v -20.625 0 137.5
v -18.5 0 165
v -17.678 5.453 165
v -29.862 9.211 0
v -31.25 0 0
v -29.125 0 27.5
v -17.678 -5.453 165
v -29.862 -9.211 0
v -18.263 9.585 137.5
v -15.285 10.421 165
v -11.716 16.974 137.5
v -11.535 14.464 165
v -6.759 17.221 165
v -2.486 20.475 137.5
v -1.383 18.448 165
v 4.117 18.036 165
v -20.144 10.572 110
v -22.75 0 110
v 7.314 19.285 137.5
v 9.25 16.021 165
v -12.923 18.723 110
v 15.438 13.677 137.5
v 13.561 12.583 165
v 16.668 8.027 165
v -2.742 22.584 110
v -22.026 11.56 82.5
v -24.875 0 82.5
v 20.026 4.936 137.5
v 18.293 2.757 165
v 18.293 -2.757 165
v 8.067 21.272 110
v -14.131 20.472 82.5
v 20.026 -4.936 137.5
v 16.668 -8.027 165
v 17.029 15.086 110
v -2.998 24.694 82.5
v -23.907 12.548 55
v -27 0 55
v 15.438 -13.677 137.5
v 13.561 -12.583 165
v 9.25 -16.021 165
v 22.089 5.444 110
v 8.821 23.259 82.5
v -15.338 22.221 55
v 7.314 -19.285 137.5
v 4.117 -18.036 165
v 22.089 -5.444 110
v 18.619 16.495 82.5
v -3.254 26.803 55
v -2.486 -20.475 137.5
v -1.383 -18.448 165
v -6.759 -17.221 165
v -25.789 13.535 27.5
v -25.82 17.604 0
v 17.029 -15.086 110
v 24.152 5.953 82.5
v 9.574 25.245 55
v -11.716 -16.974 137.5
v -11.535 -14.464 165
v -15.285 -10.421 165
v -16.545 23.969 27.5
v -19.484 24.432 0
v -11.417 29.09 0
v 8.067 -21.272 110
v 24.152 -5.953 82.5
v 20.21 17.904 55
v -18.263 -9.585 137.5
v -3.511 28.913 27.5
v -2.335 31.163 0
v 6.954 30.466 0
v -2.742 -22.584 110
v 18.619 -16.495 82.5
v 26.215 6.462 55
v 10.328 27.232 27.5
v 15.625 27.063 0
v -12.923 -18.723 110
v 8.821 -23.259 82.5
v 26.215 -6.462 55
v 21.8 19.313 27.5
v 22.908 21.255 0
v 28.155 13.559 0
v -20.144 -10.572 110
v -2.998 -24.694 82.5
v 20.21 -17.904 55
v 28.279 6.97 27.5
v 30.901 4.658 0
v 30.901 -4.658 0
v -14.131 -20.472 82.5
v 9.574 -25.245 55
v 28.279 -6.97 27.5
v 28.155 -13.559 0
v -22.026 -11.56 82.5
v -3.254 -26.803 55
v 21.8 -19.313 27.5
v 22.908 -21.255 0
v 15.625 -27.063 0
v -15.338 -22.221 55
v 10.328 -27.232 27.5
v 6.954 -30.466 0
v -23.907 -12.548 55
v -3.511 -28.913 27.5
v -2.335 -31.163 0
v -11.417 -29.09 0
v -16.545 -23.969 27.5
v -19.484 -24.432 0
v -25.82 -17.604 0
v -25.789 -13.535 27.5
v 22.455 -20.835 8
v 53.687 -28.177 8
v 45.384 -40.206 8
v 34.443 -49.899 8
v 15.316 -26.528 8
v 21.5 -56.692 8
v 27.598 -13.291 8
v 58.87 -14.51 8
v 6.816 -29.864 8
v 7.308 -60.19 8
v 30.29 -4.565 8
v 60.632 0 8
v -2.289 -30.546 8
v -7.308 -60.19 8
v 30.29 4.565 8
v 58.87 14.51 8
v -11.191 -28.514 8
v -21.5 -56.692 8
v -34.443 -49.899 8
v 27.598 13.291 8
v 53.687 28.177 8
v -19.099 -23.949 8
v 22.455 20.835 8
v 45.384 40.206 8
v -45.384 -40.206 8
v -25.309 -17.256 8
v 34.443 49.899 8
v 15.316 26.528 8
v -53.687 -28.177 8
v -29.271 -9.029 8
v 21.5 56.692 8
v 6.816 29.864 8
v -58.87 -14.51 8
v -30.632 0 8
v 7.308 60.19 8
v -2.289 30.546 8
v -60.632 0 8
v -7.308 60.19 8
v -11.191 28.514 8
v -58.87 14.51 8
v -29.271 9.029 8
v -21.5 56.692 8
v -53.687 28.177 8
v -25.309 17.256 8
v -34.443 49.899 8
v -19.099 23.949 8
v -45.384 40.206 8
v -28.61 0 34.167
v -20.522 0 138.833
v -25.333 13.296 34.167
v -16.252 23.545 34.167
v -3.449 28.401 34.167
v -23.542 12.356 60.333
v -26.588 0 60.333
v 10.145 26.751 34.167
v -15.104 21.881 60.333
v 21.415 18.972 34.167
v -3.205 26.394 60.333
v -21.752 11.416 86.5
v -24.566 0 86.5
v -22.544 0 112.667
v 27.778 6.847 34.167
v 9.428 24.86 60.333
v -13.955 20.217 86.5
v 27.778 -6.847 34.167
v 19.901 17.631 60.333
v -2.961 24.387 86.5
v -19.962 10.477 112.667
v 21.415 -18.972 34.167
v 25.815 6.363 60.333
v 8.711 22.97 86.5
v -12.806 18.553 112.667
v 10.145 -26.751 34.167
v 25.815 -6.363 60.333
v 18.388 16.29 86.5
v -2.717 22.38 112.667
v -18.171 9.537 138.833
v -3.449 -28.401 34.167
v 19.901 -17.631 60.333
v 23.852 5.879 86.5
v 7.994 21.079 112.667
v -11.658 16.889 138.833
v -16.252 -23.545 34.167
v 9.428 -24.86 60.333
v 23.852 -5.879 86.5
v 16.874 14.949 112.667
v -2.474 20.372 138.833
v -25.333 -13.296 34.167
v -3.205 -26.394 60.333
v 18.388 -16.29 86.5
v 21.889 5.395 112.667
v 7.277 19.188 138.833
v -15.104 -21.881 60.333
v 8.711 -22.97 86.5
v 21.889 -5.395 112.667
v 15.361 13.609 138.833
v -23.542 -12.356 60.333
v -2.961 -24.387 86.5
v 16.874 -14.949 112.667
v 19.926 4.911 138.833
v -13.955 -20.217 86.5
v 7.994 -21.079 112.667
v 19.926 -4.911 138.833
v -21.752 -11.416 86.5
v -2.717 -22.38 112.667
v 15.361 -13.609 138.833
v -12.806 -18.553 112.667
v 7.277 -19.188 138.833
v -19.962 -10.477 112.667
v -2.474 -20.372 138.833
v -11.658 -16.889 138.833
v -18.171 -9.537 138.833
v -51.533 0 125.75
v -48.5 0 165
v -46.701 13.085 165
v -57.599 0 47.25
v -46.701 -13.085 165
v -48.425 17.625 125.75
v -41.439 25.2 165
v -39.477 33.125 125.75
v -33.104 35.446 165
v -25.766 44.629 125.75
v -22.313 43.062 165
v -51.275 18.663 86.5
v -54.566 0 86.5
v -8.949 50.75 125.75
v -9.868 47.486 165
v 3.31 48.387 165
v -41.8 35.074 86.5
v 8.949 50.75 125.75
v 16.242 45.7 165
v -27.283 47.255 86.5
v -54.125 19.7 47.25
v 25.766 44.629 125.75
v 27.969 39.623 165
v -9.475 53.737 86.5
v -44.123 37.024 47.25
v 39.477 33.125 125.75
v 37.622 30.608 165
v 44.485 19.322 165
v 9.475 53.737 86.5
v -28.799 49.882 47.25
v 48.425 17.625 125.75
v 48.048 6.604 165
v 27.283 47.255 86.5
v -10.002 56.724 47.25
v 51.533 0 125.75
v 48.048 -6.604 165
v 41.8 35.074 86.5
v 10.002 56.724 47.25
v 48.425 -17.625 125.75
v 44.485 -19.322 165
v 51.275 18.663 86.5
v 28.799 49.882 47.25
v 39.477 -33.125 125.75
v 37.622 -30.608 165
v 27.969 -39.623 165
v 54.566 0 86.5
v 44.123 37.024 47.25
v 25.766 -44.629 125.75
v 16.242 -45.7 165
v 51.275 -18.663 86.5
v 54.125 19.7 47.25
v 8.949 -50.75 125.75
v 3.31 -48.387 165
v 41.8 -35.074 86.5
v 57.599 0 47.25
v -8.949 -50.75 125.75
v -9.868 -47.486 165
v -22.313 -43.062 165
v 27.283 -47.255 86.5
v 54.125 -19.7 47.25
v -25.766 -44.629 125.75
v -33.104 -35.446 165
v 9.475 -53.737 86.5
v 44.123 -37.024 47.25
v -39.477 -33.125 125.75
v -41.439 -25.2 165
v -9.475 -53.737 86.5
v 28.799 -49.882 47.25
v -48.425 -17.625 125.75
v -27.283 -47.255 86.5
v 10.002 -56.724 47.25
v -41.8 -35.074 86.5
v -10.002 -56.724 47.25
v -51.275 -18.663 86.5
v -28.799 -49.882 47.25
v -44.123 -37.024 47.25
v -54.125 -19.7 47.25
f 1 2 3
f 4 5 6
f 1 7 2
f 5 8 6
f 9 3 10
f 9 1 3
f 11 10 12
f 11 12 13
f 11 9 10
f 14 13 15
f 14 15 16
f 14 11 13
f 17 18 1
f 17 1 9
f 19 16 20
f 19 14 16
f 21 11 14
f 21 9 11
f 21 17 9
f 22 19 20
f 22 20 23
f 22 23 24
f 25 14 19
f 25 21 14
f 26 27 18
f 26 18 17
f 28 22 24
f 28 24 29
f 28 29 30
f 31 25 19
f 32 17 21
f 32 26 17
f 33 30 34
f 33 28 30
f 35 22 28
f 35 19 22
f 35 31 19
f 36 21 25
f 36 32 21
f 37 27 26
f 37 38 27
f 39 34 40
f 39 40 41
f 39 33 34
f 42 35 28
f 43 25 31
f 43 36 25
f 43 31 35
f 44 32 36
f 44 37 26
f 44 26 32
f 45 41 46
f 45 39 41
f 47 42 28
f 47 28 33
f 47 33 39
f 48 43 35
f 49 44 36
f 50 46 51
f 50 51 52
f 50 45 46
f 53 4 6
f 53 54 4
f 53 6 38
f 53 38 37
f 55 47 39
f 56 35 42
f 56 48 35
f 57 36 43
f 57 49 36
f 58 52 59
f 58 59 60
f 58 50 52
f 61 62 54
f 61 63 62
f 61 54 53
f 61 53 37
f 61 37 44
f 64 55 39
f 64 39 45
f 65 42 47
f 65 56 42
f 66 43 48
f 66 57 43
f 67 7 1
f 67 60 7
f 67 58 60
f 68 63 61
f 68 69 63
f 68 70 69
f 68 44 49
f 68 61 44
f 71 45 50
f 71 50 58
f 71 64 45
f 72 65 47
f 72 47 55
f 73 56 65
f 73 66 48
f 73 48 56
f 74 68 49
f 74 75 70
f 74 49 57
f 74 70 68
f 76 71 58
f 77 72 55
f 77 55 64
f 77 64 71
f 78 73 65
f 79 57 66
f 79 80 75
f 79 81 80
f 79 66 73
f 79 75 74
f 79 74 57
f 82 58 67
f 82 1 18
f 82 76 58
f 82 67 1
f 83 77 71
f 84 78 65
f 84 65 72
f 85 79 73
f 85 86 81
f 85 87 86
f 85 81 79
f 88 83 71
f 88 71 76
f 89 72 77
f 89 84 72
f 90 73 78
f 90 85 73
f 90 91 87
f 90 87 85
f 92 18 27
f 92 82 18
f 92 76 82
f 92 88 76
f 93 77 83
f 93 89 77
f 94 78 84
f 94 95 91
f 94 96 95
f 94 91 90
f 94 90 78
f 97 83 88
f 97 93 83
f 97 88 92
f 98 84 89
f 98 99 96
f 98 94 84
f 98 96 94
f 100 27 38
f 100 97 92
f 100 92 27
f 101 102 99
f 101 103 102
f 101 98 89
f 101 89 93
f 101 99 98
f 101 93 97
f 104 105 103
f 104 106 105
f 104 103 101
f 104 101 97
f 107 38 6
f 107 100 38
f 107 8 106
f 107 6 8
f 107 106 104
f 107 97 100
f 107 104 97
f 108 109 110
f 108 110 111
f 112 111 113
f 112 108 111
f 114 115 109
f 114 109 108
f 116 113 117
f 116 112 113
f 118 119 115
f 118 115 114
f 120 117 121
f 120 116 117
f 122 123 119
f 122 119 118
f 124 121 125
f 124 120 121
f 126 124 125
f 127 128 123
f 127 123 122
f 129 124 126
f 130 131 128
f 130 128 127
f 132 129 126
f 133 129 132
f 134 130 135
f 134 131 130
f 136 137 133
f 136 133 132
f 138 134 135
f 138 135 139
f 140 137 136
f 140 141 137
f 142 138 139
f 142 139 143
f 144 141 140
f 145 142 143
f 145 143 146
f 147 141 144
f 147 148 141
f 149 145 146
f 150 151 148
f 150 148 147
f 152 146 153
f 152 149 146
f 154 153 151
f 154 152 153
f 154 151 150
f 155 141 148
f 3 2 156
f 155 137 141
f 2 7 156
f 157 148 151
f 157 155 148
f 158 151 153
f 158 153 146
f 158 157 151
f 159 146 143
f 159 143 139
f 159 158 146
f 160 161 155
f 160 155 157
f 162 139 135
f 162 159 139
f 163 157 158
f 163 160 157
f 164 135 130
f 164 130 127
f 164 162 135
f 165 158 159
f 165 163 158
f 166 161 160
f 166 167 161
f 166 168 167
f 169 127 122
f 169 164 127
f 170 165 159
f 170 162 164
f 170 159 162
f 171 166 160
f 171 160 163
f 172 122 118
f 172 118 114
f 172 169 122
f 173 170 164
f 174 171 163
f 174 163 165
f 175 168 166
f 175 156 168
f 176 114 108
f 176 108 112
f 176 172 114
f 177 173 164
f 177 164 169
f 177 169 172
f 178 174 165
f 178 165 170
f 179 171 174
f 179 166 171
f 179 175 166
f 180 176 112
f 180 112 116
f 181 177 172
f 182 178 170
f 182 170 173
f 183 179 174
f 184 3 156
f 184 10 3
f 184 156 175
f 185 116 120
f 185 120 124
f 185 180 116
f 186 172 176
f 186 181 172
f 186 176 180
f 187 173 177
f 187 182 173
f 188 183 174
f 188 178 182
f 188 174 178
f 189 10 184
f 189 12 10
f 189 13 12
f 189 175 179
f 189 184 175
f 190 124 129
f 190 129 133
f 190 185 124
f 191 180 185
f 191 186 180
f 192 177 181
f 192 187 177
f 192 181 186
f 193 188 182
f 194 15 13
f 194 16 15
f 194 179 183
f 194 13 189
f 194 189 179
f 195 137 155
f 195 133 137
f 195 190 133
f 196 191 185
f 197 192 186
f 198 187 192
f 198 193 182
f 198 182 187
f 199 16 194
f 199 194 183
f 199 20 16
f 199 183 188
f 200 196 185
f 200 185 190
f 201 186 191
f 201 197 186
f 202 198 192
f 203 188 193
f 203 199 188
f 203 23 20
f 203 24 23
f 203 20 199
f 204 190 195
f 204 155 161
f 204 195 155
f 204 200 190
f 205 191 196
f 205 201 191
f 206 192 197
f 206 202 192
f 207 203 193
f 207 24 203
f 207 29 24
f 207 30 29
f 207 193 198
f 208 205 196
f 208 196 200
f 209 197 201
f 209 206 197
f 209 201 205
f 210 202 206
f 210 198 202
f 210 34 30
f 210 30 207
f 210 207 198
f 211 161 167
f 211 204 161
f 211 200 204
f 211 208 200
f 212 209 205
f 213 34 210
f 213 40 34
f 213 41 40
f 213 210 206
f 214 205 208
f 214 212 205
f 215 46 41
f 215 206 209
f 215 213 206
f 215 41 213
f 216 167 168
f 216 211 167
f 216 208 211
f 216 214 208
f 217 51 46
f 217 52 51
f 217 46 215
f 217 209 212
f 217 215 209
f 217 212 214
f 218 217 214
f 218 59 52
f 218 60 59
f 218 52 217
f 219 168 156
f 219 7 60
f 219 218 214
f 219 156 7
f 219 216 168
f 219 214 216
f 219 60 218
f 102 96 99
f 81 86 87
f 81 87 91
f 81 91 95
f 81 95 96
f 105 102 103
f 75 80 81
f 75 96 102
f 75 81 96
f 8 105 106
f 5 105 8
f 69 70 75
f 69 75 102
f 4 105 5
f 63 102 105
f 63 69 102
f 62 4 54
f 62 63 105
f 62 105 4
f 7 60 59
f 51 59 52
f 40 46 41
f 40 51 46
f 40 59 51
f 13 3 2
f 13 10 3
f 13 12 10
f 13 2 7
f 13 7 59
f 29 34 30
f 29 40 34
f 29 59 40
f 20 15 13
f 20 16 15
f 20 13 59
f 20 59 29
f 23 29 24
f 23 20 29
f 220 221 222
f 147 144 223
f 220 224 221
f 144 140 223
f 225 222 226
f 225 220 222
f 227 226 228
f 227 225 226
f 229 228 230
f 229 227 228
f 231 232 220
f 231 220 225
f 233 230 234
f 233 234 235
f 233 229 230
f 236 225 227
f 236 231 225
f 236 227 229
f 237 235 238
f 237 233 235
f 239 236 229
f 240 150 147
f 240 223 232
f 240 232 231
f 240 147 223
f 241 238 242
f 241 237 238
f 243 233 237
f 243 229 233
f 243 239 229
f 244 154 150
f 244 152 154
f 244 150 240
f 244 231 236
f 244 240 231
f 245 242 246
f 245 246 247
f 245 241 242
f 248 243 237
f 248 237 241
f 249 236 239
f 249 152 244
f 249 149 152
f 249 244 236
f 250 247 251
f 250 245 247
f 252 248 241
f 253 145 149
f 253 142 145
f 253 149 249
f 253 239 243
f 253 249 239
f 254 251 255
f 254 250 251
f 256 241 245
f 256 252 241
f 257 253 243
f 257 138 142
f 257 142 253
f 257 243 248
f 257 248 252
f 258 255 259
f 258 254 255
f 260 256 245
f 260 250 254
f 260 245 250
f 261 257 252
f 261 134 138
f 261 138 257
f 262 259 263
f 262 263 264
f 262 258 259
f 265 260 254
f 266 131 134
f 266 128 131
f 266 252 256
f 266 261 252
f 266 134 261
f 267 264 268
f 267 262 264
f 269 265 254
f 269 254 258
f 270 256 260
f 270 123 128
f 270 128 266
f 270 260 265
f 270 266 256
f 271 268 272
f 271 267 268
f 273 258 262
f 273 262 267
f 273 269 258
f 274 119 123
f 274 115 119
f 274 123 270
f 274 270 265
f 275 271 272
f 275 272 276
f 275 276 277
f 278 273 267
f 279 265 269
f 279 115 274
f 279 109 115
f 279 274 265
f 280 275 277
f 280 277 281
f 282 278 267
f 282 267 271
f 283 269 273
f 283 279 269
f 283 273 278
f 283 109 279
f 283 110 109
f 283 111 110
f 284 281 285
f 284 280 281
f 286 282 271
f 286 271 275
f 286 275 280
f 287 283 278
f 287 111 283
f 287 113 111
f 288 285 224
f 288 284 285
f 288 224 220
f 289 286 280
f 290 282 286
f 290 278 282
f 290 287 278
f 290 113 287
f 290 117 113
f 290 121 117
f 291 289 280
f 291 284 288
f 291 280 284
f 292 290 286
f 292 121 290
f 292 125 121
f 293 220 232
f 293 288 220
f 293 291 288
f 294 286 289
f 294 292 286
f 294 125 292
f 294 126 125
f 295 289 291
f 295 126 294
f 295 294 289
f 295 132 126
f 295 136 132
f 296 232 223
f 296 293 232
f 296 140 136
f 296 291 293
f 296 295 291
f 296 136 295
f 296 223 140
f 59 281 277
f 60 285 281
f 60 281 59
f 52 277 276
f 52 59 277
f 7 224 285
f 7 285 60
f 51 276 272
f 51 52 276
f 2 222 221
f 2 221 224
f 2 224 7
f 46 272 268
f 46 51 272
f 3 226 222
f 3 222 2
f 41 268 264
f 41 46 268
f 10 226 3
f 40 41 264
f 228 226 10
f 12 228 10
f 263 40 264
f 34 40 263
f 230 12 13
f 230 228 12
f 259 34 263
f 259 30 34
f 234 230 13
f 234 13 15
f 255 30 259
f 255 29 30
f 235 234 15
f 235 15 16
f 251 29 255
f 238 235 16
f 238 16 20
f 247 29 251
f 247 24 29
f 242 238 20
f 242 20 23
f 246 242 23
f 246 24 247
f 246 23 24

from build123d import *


with BuildPart() as f1:
    # F0 (on Front) → F1 (revolve)
    with BuildSketch(Plane.XZ):
        Polygon((-31.25, 0), (0, 0), (0, 165), (-18.5, 165), align=None)
    revolve(axis=Axis((0, 0, 82.5), (0, 0, -1)))


with BuildPart() as f3:
    # F2 (on Front) → F3 (revolve)
    with BuildSketch(Plane.XZ):
        Polygon((-60.631818, 8), (-30.631818, 8), (-18.5, 165), (-48.5, 165), align=None)
    revolve(axis=Axis((0, 0, 86.5), (0, 0, -1)))


solid = Compound([f1.part, f3.part])
